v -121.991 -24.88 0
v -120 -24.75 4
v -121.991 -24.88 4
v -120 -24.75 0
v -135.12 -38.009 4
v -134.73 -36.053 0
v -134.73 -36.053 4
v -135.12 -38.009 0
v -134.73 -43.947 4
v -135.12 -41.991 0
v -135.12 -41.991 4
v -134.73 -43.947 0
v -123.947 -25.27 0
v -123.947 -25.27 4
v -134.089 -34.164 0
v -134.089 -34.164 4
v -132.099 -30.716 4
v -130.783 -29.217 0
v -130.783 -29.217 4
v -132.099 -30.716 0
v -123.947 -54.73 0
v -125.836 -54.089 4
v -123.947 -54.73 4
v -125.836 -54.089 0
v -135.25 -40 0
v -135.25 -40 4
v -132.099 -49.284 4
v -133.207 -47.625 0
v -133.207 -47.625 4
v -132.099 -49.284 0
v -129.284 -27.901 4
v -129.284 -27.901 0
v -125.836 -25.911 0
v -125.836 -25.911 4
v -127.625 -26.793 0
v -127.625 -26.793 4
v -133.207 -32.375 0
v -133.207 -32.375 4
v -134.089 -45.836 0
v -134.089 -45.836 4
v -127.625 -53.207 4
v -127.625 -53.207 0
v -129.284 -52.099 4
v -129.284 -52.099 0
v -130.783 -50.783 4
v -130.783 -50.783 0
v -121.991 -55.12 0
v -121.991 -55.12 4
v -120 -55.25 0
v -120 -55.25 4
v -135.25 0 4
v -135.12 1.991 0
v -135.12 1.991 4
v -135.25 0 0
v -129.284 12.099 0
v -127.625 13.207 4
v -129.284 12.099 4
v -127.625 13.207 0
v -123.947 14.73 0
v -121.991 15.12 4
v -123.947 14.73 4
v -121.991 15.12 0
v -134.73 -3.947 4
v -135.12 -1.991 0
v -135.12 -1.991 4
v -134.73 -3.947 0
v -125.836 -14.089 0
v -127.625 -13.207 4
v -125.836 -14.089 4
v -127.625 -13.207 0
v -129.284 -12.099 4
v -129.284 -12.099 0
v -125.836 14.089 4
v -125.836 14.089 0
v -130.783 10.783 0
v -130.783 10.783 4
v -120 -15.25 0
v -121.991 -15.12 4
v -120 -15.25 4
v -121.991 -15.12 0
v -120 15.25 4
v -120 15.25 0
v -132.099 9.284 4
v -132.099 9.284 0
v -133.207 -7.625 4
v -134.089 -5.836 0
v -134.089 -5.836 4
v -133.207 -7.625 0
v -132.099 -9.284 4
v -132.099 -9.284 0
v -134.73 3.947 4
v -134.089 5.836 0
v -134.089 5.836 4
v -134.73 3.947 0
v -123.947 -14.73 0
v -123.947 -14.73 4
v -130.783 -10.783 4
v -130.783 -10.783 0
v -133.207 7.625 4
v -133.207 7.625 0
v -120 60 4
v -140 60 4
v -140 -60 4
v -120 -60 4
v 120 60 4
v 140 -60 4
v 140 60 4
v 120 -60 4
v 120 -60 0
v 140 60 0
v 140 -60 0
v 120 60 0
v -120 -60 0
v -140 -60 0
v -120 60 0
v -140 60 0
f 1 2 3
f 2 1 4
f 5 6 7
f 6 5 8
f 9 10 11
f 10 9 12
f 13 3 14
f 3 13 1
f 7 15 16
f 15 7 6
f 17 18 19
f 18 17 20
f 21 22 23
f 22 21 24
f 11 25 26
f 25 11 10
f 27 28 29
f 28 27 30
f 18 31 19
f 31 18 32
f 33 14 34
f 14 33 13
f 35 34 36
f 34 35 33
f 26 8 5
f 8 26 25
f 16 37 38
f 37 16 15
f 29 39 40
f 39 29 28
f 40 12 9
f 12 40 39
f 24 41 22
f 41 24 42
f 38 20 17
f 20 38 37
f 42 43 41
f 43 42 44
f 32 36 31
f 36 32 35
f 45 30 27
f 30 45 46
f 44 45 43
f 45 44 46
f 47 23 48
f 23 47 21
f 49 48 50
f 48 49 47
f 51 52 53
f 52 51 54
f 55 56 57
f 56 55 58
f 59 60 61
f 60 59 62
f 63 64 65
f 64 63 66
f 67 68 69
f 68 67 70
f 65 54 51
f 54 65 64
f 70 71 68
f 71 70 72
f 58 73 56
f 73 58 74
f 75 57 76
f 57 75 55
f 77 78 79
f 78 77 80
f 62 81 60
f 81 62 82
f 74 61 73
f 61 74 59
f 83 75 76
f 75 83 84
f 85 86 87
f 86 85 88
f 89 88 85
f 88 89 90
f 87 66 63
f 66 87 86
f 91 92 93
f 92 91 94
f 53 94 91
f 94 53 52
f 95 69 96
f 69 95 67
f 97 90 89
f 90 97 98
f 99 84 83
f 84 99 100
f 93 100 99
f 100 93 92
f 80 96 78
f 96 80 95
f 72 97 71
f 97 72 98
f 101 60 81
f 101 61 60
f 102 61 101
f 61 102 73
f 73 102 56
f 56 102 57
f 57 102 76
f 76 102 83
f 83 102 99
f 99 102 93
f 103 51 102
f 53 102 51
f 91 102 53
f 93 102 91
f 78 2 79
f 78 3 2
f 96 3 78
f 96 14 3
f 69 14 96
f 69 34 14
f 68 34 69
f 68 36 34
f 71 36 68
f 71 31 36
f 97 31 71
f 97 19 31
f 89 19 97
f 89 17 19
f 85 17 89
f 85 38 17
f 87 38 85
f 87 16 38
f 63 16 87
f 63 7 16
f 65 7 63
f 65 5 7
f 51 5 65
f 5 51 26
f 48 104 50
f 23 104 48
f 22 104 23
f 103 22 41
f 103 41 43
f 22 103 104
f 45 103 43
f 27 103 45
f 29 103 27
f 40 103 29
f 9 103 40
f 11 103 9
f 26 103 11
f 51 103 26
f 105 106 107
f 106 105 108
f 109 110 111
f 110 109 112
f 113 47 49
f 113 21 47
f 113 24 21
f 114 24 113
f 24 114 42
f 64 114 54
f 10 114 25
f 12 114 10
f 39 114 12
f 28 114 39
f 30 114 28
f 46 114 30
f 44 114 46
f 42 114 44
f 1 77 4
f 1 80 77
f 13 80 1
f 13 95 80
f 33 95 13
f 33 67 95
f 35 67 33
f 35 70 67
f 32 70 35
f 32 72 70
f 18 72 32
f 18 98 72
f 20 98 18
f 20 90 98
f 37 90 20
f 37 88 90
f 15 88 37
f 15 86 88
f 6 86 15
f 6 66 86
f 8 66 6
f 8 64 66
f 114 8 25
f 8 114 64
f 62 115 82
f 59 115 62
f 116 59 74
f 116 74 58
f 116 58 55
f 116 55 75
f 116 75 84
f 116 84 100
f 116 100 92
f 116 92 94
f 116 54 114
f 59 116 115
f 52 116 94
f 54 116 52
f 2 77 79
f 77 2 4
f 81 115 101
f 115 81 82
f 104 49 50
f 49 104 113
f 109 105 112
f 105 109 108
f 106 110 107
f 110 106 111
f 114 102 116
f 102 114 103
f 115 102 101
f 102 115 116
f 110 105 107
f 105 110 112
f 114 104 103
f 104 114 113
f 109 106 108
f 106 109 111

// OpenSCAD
// Tube rack - a flat plate with a regular grid of tube holes and two solid side walls.
// The two walls rest on a surface and the tubes pass through the holes. The short ends are open.
// NOVEL general part (not one of the 16 benchmark tasks).
//
// Parametric for augmentation. Ranges are the sane envelope a variant may be drawn from:

cols   = 6;
rows   = 2;
tube_d = 30.5;
pitch_x = 40;
pitch_y = 40;
base_t = 4;
wall_h = 70;

$fn = 48;

plate_L = cols * pitch_x + 2 * (pitch_x / 2);      // centre-to-centre span X + one radius each side
plate_W = rows * pitch_y + 2 * (pitch_y / 2);      // centre-to-centre span Y + one radius each side

difference() {
    translate([-plate_L / 2, -plate_W / 2, 0]) cube([plate_L, plate_W, base_t]);
    for (i = [0 : cols - 1], j = [0 : rows - 1])
        translate([
            -plate_L / 2 + pitch_x / 2 + i * pitch_x,
            -plate_W / 2 + pitch_y / 2 + j * pitch_y,
            -1
        ]) cylinder(h = base_t + 2, d = tube_d);
    for (i = [0 : cols - 1])
        translate([-plate_L / 2 + pitch_x / 2 + i * pitch_x, -plate_W / 2 - 1, 0])
            cube([pitch_x, plate_W + 2, base_t]);           // side walls along the long (X) edges
}
